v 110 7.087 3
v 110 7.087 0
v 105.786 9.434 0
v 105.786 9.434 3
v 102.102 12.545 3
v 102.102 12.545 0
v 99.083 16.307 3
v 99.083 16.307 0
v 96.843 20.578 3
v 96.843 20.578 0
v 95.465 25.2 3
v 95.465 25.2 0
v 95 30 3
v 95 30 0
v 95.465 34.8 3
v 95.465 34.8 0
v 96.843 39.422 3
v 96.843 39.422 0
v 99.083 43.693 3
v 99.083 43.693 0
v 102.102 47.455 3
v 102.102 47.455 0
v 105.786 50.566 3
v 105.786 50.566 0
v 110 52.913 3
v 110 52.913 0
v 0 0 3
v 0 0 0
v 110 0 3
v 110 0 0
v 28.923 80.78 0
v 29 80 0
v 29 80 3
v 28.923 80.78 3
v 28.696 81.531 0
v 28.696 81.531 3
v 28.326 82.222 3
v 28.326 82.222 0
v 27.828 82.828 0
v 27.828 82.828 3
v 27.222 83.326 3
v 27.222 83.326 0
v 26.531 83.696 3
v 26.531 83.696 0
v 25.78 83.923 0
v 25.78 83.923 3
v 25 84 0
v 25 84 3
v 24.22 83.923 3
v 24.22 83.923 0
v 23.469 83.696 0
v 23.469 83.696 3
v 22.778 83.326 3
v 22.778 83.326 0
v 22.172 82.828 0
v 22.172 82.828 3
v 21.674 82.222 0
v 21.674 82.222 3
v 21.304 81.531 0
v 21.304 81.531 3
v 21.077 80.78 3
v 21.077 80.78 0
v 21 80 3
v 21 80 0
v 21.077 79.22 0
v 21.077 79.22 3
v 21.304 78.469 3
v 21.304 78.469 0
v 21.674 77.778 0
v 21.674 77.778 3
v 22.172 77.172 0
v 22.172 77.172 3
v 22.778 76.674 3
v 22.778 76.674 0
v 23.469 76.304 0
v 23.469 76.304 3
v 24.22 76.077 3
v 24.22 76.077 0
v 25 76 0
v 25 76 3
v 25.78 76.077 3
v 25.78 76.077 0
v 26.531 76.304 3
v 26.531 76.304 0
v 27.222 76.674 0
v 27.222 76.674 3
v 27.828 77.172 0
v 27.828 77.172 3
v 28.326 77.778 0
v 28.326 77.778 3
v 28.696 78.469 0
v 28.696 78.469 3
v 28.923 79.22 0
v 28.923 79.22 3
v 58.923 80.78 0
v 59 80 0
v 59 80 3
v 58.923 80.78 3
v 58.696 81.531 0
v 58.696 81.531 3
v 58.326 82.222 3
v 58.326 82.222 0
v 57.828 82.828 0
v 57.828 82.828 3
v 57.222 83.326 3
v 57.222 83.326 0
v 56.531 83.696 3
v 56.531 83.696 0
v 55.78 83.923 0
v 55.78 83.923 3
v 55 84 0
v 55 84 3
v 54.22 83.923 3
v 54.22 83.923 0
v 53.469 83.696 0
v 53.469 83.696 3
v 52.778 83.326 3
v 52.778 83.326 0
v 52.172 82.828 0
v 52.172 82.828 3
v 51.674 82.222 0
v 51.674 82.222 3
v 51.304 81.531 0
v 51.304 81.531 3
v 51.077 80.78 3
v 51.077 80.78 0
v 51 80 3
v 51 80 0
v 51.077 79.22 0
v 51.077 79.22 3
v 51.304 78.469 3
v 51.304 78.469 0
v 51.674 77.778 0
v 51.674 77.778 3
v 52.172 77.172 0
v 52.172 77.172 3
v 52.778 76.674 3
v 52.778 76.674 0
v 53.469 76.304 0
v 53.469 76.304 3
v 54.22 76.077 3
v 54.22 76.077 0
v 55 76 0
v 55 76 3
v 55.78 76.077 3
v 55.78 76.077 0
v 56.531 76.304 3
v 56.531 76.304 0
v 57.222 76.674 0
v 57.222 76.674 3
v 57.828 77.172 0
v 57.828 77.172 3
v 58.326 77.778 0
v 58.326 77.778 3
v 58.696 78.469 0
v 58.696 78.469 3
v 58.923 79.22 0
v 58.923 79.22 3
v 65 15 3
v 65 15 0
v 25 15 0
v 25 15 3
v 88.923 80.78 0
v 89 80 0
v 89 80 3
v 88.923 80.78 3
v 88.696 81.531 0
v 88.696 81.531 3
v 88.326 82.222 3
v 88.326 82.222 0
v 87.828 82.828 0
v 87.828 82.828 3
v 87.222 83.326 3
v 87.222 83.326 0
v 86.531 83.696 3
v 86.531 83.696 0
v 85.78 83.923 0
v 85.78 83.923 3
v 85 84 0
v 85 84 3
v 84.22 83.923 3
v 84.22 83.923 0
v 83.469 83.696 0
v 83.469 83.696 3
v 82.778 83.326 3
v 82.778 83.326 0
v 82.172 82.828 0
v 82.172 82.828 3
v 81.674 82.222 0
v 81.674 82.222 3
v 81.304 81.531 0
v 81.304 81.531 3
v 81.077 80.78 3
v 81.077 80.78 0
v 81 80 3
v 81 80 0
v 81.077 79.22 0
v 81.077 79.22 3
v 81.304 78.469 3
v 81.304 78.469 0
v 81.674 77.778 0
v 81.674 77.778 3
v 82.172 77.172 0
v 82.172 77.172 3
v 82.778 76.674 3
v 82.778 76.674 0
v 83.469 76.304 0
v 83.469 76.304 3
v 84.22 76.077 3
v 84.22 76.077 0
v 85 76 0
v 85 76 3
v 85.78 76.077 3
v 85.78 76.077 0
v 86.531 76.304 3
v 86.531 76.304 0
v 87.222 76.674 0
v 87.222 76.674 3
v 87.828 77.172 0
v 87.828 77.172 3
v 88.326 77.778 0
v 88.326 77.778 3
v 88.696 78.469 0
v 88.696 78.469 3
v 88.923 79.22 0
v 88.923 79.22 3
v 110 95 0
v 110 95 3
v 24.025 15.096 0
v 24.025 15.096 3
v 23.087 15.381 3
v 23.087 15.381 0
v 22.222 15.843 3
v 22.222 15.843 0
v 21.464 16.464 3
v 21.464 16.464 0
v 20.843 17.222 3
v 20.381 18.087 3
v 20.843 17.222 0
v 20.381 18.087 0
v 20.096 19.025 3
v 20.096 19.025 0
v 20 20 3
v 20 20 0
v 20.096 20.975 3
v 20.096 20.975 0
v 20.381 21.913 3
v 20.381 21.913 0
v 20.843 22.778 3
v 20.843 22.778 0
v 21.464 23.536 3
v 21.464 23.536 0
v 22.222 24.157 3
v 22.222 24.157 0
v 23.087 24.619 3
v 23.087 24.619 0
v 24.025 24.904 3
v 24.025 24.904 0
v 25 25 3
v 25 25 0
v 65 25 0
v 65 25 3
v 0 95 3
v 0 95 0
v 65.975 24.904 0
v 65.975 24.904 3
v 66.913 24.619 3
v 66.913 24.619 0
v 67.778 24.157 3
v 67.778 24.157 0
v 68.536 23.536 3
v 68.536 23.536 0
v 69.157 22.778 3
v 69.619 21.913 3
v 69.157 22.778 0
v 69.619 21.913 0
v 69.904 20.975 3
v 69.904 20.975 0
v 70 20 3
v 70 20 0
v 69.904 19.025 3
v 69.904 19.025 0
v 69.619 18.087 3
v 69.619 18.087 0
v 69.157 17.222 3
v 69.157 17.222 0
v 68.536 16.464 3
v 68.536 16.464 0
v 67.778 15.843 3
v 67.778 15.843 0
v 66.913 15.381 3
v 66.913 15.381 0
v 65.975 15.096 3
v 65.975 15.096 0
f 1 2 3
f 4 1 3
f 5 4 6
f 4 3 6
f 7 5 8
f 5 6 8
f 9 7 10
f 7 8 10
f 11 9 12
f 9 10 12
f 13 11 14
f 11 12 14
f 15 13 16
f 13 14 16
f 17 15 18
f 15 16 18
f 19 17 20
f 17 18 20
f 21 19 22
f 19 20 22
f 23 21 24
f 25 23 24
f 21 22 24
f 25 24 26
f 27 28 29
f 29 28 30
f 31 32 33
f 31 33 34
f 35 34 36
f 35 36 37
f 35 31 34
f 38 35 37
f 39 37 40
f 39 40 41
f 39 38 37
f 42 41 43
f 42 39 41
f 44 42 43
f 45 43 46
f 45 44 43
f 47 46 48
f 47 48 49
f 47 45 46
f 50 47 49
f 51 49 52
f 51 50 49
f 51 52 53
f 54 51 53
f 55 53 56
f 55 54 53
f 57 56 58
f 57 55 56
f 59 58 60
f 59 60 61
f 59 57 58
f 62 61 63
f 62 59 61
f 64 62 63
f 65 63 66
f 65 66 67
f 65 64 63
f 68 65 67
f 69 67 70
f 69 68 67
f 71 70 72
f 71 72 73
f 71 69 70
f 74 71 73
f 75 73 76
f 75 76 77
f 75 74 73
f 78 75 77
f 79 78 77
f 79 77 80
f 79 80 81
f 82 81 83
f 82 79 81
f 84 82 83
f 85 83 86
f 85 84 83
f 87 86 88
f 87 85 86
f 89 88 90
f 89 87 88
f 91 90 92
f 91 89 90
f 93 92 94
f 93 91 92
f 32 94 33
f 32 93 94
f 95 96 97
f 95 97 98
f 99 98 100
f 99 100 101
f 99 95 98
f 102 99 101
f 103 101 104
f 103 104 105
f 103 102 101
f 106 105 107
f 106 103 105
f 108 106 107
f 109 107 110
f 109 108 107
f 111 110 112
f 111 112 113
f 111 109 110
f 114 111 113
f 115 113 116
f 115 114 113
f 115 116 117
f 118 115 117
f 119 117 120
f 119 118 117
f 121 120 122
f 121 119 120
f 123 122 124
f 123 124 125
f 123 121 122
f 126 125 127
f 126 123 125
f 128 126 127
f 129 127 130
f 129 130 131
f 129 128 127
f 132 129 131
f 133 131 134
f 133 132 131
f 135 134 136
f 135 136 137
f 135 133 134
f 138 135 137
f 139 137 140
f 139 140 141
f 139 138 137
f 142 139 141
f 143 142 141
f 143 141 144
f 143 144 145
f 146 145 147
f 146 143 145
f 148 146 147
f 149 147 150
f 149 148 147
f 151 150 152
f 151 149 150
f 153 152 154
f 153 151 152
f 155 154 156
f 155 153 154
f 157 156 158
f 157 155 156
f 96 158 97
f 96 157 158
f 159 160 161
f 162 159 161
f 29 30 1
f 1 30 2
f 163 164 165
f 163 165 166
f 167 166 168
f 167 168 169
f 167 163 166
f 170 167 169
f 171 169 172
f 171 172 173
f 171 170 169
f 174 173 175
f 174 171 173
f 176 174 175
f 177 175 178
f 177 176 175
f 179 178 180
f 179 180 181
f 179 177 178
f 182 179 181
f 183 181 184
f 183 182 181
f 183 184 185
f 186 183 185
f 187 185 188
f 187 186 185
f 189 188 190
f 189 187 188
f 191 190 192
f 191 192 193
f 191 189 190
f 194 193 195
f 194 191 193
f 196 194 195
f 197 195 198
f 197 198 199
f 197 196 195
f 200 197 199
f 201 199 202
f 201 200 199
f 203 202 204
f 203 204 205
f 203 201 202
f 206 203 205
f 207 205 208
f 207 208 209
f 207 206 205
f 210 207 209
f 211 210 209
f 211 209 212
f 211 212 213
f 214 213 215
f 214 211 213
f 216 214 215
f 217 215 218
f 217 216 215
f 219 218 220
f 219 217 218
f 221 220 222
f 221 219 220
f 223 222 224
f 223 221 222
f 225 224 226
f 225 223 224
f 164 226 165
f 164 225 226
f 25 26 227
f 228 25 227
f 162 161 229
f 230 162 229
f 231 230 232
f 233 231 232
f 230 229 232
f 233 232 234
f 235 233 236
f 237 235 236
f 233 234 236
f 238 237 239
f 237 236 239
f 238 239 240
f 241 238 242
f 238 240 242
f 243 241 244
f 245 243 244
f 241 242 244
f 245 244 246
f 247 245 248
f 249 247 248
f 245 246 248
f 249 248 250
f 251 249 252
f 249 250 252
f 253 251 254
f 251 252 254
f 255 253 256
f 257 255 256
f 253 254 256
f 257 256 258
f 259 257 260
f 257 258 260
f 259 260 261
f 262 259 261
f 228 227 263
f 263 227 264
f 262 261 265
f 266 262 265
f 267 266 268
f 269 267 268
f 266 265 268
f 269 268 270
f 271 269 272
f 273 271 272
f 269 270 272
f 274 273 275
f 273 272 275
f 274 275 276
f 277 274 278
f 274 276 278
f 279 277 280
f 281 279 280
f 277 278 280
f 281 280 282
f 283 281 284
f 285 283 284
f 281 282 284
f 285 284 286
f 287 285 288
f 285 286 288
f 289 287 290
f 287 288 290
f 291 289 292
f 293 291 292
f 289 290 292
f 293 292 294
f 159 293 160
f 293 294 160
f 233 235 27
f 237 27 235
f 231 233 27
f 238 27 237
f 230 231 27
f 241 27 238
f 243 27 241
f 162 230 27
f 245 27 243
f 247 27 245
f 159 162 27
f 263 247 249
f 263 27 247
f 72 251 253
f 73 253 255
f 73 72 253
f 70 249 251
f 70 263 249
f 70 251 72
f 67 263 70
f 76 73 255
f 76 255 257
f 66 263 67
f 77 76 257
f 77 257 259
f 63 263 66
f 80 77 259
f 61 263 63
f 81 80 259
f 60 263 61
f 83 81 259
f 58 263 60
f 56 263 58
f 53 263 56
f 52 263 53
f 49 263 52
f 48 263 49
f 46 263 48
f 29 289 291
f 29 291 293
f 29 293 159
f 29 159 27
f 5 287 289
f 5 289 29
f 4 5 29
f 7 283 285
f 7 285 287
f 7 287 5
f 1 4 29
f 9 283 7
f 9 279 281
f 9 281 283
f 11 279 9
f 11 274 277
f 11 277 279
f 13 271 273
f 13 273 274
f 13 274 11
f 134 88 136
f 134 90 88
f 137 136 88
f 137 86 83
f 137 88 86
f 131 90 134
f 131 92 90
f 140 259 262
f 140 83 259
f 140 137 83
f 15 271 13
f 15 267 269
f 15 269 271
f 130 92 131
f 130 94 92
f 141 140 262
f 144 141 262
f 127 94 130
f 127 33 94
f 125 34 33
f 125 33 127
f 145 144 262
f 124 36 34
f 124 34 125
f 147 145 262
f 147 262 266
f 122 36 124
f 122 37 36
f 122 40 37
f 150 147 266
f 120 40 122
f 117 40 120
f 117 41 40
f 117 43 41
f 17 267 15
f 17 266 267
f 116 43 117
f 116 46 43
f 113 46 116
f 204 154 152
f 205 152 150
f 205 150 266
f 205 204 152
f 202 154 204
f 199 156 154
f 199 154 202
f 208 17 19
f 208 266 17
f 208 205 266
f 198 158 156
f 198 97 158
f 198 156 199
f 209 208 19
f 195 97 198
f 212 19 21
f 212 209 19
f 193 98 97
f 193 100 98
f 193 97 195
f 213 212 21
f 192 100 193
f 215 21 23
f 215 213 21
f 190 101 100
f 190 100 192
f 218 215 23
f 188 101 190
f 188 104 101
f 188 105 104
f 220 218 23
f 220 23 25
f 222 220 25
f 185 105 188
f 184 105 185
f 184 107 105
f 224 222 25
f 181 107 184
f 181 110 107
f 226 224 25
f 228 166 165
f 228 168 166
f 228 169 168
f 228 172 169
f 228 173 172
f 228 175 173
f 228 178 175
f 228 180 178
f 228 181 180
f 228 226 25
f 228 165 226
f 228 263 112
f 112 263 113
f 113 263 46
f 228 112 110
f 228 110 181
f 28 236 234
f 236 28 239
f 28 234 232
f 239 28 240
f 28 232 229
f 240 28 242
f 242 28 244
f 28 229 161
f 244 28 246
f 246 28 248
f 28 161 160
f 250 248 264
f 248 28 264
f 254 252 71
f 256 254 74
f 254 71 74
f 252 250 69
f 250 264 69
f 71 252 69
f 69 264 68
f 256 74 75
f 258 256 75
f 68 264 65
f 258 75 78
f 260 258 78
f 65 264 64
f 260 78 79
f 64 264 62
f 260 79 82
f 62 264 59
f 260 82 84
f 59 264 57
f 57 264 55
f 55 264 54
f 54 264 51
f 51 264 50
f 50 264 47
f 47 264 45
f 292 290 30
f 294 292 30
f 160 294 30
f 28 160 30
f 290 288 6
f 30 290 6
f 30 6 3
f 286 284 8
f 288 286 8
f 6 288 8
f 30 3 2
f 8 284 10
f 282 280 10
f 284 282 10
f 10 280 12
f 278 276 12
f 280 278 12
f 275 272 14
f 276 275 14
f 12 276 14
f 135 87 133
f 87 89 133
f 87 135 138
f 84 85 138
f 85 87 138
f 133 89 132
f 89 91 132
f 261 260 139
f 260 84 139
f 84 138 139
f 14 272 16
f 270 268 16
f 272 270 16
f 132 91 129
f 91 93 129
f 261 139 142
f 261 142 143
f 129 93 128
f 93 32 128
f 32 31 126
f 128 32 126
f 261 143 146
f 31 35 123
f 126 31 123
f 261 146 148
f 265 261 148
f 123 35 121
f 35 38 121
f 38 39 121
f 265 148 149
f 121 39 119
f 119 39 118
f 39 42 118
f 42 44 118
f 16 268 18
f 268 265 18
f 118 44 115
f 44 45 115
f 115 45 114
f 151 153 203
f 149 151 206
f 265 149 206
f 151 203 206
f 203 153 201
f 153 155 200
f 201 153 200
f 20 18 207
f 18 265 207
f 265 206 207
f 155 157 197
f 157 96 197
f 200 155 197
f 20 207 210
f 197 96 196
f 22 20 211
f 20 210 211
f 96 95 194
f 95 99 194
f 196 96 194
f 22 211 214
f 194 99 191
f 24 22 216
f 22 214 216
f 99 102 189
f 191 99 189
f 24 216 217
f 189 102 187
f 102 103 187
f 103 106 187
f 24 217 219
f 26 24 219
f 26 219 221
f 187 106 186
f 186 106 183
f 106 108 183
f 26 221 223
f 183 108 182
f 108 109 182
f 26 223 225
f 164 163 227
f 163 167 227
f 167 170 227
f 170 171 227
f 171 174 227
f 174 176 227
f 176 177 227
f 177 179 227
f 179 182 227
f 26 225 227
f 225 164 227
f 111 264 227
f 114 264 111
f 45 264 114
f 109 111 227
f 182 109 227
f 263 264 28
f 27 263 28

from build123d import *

# Parameters (mm, degrees)
SKIZZE1_R                       = 4
AUFSATZ_LINEAR_AUSTRAGEN1_DEPTH = 3


with BuildPart() as part:
    # Skizze1 → Aufsatz-Linear austragen1 (new body)
    with BuildSketch(Plane.XY):
        with BuildLine():
            Line((0, 0), (110, 0))
            Line((110, 0), (110, 7.087121525))
            ThreePointArc((110, 7.087121525), (95, 30), (110, 52.912878475))
            Line((110, 52.912878475), (110, 95))
            Line((110, 95), (0, 95))
            Line((0, 95), (0, 0))
        make_face()
        with Locations((25, 80)):
            Circle(SKIZZE1_R, mode=Mode.SUBTRACT)
        with Locations((55, 80)):
            Circle(SKIZZE1_R, mode=Mode.SUBTRACT)
        with Locations((85, 80)):
            Circle(SKIZZE1_R, mode=Mode.SUBTRACT)
        with BuildLine():
            Line((25, 25), (65, 25))
            ThreePointArc((65, 25), (70, 20), (65, 15))
            Line((65, 15), (25, 15))
            ThreePointArc((25, 15), (20, 20), (25, 25))
        make_face(mode=Mode.SUBTRACT)
    extrude(amount=AUFSATZ_LINEAR_AUSTRAGEN1_DEPTH)


solid = part.part
